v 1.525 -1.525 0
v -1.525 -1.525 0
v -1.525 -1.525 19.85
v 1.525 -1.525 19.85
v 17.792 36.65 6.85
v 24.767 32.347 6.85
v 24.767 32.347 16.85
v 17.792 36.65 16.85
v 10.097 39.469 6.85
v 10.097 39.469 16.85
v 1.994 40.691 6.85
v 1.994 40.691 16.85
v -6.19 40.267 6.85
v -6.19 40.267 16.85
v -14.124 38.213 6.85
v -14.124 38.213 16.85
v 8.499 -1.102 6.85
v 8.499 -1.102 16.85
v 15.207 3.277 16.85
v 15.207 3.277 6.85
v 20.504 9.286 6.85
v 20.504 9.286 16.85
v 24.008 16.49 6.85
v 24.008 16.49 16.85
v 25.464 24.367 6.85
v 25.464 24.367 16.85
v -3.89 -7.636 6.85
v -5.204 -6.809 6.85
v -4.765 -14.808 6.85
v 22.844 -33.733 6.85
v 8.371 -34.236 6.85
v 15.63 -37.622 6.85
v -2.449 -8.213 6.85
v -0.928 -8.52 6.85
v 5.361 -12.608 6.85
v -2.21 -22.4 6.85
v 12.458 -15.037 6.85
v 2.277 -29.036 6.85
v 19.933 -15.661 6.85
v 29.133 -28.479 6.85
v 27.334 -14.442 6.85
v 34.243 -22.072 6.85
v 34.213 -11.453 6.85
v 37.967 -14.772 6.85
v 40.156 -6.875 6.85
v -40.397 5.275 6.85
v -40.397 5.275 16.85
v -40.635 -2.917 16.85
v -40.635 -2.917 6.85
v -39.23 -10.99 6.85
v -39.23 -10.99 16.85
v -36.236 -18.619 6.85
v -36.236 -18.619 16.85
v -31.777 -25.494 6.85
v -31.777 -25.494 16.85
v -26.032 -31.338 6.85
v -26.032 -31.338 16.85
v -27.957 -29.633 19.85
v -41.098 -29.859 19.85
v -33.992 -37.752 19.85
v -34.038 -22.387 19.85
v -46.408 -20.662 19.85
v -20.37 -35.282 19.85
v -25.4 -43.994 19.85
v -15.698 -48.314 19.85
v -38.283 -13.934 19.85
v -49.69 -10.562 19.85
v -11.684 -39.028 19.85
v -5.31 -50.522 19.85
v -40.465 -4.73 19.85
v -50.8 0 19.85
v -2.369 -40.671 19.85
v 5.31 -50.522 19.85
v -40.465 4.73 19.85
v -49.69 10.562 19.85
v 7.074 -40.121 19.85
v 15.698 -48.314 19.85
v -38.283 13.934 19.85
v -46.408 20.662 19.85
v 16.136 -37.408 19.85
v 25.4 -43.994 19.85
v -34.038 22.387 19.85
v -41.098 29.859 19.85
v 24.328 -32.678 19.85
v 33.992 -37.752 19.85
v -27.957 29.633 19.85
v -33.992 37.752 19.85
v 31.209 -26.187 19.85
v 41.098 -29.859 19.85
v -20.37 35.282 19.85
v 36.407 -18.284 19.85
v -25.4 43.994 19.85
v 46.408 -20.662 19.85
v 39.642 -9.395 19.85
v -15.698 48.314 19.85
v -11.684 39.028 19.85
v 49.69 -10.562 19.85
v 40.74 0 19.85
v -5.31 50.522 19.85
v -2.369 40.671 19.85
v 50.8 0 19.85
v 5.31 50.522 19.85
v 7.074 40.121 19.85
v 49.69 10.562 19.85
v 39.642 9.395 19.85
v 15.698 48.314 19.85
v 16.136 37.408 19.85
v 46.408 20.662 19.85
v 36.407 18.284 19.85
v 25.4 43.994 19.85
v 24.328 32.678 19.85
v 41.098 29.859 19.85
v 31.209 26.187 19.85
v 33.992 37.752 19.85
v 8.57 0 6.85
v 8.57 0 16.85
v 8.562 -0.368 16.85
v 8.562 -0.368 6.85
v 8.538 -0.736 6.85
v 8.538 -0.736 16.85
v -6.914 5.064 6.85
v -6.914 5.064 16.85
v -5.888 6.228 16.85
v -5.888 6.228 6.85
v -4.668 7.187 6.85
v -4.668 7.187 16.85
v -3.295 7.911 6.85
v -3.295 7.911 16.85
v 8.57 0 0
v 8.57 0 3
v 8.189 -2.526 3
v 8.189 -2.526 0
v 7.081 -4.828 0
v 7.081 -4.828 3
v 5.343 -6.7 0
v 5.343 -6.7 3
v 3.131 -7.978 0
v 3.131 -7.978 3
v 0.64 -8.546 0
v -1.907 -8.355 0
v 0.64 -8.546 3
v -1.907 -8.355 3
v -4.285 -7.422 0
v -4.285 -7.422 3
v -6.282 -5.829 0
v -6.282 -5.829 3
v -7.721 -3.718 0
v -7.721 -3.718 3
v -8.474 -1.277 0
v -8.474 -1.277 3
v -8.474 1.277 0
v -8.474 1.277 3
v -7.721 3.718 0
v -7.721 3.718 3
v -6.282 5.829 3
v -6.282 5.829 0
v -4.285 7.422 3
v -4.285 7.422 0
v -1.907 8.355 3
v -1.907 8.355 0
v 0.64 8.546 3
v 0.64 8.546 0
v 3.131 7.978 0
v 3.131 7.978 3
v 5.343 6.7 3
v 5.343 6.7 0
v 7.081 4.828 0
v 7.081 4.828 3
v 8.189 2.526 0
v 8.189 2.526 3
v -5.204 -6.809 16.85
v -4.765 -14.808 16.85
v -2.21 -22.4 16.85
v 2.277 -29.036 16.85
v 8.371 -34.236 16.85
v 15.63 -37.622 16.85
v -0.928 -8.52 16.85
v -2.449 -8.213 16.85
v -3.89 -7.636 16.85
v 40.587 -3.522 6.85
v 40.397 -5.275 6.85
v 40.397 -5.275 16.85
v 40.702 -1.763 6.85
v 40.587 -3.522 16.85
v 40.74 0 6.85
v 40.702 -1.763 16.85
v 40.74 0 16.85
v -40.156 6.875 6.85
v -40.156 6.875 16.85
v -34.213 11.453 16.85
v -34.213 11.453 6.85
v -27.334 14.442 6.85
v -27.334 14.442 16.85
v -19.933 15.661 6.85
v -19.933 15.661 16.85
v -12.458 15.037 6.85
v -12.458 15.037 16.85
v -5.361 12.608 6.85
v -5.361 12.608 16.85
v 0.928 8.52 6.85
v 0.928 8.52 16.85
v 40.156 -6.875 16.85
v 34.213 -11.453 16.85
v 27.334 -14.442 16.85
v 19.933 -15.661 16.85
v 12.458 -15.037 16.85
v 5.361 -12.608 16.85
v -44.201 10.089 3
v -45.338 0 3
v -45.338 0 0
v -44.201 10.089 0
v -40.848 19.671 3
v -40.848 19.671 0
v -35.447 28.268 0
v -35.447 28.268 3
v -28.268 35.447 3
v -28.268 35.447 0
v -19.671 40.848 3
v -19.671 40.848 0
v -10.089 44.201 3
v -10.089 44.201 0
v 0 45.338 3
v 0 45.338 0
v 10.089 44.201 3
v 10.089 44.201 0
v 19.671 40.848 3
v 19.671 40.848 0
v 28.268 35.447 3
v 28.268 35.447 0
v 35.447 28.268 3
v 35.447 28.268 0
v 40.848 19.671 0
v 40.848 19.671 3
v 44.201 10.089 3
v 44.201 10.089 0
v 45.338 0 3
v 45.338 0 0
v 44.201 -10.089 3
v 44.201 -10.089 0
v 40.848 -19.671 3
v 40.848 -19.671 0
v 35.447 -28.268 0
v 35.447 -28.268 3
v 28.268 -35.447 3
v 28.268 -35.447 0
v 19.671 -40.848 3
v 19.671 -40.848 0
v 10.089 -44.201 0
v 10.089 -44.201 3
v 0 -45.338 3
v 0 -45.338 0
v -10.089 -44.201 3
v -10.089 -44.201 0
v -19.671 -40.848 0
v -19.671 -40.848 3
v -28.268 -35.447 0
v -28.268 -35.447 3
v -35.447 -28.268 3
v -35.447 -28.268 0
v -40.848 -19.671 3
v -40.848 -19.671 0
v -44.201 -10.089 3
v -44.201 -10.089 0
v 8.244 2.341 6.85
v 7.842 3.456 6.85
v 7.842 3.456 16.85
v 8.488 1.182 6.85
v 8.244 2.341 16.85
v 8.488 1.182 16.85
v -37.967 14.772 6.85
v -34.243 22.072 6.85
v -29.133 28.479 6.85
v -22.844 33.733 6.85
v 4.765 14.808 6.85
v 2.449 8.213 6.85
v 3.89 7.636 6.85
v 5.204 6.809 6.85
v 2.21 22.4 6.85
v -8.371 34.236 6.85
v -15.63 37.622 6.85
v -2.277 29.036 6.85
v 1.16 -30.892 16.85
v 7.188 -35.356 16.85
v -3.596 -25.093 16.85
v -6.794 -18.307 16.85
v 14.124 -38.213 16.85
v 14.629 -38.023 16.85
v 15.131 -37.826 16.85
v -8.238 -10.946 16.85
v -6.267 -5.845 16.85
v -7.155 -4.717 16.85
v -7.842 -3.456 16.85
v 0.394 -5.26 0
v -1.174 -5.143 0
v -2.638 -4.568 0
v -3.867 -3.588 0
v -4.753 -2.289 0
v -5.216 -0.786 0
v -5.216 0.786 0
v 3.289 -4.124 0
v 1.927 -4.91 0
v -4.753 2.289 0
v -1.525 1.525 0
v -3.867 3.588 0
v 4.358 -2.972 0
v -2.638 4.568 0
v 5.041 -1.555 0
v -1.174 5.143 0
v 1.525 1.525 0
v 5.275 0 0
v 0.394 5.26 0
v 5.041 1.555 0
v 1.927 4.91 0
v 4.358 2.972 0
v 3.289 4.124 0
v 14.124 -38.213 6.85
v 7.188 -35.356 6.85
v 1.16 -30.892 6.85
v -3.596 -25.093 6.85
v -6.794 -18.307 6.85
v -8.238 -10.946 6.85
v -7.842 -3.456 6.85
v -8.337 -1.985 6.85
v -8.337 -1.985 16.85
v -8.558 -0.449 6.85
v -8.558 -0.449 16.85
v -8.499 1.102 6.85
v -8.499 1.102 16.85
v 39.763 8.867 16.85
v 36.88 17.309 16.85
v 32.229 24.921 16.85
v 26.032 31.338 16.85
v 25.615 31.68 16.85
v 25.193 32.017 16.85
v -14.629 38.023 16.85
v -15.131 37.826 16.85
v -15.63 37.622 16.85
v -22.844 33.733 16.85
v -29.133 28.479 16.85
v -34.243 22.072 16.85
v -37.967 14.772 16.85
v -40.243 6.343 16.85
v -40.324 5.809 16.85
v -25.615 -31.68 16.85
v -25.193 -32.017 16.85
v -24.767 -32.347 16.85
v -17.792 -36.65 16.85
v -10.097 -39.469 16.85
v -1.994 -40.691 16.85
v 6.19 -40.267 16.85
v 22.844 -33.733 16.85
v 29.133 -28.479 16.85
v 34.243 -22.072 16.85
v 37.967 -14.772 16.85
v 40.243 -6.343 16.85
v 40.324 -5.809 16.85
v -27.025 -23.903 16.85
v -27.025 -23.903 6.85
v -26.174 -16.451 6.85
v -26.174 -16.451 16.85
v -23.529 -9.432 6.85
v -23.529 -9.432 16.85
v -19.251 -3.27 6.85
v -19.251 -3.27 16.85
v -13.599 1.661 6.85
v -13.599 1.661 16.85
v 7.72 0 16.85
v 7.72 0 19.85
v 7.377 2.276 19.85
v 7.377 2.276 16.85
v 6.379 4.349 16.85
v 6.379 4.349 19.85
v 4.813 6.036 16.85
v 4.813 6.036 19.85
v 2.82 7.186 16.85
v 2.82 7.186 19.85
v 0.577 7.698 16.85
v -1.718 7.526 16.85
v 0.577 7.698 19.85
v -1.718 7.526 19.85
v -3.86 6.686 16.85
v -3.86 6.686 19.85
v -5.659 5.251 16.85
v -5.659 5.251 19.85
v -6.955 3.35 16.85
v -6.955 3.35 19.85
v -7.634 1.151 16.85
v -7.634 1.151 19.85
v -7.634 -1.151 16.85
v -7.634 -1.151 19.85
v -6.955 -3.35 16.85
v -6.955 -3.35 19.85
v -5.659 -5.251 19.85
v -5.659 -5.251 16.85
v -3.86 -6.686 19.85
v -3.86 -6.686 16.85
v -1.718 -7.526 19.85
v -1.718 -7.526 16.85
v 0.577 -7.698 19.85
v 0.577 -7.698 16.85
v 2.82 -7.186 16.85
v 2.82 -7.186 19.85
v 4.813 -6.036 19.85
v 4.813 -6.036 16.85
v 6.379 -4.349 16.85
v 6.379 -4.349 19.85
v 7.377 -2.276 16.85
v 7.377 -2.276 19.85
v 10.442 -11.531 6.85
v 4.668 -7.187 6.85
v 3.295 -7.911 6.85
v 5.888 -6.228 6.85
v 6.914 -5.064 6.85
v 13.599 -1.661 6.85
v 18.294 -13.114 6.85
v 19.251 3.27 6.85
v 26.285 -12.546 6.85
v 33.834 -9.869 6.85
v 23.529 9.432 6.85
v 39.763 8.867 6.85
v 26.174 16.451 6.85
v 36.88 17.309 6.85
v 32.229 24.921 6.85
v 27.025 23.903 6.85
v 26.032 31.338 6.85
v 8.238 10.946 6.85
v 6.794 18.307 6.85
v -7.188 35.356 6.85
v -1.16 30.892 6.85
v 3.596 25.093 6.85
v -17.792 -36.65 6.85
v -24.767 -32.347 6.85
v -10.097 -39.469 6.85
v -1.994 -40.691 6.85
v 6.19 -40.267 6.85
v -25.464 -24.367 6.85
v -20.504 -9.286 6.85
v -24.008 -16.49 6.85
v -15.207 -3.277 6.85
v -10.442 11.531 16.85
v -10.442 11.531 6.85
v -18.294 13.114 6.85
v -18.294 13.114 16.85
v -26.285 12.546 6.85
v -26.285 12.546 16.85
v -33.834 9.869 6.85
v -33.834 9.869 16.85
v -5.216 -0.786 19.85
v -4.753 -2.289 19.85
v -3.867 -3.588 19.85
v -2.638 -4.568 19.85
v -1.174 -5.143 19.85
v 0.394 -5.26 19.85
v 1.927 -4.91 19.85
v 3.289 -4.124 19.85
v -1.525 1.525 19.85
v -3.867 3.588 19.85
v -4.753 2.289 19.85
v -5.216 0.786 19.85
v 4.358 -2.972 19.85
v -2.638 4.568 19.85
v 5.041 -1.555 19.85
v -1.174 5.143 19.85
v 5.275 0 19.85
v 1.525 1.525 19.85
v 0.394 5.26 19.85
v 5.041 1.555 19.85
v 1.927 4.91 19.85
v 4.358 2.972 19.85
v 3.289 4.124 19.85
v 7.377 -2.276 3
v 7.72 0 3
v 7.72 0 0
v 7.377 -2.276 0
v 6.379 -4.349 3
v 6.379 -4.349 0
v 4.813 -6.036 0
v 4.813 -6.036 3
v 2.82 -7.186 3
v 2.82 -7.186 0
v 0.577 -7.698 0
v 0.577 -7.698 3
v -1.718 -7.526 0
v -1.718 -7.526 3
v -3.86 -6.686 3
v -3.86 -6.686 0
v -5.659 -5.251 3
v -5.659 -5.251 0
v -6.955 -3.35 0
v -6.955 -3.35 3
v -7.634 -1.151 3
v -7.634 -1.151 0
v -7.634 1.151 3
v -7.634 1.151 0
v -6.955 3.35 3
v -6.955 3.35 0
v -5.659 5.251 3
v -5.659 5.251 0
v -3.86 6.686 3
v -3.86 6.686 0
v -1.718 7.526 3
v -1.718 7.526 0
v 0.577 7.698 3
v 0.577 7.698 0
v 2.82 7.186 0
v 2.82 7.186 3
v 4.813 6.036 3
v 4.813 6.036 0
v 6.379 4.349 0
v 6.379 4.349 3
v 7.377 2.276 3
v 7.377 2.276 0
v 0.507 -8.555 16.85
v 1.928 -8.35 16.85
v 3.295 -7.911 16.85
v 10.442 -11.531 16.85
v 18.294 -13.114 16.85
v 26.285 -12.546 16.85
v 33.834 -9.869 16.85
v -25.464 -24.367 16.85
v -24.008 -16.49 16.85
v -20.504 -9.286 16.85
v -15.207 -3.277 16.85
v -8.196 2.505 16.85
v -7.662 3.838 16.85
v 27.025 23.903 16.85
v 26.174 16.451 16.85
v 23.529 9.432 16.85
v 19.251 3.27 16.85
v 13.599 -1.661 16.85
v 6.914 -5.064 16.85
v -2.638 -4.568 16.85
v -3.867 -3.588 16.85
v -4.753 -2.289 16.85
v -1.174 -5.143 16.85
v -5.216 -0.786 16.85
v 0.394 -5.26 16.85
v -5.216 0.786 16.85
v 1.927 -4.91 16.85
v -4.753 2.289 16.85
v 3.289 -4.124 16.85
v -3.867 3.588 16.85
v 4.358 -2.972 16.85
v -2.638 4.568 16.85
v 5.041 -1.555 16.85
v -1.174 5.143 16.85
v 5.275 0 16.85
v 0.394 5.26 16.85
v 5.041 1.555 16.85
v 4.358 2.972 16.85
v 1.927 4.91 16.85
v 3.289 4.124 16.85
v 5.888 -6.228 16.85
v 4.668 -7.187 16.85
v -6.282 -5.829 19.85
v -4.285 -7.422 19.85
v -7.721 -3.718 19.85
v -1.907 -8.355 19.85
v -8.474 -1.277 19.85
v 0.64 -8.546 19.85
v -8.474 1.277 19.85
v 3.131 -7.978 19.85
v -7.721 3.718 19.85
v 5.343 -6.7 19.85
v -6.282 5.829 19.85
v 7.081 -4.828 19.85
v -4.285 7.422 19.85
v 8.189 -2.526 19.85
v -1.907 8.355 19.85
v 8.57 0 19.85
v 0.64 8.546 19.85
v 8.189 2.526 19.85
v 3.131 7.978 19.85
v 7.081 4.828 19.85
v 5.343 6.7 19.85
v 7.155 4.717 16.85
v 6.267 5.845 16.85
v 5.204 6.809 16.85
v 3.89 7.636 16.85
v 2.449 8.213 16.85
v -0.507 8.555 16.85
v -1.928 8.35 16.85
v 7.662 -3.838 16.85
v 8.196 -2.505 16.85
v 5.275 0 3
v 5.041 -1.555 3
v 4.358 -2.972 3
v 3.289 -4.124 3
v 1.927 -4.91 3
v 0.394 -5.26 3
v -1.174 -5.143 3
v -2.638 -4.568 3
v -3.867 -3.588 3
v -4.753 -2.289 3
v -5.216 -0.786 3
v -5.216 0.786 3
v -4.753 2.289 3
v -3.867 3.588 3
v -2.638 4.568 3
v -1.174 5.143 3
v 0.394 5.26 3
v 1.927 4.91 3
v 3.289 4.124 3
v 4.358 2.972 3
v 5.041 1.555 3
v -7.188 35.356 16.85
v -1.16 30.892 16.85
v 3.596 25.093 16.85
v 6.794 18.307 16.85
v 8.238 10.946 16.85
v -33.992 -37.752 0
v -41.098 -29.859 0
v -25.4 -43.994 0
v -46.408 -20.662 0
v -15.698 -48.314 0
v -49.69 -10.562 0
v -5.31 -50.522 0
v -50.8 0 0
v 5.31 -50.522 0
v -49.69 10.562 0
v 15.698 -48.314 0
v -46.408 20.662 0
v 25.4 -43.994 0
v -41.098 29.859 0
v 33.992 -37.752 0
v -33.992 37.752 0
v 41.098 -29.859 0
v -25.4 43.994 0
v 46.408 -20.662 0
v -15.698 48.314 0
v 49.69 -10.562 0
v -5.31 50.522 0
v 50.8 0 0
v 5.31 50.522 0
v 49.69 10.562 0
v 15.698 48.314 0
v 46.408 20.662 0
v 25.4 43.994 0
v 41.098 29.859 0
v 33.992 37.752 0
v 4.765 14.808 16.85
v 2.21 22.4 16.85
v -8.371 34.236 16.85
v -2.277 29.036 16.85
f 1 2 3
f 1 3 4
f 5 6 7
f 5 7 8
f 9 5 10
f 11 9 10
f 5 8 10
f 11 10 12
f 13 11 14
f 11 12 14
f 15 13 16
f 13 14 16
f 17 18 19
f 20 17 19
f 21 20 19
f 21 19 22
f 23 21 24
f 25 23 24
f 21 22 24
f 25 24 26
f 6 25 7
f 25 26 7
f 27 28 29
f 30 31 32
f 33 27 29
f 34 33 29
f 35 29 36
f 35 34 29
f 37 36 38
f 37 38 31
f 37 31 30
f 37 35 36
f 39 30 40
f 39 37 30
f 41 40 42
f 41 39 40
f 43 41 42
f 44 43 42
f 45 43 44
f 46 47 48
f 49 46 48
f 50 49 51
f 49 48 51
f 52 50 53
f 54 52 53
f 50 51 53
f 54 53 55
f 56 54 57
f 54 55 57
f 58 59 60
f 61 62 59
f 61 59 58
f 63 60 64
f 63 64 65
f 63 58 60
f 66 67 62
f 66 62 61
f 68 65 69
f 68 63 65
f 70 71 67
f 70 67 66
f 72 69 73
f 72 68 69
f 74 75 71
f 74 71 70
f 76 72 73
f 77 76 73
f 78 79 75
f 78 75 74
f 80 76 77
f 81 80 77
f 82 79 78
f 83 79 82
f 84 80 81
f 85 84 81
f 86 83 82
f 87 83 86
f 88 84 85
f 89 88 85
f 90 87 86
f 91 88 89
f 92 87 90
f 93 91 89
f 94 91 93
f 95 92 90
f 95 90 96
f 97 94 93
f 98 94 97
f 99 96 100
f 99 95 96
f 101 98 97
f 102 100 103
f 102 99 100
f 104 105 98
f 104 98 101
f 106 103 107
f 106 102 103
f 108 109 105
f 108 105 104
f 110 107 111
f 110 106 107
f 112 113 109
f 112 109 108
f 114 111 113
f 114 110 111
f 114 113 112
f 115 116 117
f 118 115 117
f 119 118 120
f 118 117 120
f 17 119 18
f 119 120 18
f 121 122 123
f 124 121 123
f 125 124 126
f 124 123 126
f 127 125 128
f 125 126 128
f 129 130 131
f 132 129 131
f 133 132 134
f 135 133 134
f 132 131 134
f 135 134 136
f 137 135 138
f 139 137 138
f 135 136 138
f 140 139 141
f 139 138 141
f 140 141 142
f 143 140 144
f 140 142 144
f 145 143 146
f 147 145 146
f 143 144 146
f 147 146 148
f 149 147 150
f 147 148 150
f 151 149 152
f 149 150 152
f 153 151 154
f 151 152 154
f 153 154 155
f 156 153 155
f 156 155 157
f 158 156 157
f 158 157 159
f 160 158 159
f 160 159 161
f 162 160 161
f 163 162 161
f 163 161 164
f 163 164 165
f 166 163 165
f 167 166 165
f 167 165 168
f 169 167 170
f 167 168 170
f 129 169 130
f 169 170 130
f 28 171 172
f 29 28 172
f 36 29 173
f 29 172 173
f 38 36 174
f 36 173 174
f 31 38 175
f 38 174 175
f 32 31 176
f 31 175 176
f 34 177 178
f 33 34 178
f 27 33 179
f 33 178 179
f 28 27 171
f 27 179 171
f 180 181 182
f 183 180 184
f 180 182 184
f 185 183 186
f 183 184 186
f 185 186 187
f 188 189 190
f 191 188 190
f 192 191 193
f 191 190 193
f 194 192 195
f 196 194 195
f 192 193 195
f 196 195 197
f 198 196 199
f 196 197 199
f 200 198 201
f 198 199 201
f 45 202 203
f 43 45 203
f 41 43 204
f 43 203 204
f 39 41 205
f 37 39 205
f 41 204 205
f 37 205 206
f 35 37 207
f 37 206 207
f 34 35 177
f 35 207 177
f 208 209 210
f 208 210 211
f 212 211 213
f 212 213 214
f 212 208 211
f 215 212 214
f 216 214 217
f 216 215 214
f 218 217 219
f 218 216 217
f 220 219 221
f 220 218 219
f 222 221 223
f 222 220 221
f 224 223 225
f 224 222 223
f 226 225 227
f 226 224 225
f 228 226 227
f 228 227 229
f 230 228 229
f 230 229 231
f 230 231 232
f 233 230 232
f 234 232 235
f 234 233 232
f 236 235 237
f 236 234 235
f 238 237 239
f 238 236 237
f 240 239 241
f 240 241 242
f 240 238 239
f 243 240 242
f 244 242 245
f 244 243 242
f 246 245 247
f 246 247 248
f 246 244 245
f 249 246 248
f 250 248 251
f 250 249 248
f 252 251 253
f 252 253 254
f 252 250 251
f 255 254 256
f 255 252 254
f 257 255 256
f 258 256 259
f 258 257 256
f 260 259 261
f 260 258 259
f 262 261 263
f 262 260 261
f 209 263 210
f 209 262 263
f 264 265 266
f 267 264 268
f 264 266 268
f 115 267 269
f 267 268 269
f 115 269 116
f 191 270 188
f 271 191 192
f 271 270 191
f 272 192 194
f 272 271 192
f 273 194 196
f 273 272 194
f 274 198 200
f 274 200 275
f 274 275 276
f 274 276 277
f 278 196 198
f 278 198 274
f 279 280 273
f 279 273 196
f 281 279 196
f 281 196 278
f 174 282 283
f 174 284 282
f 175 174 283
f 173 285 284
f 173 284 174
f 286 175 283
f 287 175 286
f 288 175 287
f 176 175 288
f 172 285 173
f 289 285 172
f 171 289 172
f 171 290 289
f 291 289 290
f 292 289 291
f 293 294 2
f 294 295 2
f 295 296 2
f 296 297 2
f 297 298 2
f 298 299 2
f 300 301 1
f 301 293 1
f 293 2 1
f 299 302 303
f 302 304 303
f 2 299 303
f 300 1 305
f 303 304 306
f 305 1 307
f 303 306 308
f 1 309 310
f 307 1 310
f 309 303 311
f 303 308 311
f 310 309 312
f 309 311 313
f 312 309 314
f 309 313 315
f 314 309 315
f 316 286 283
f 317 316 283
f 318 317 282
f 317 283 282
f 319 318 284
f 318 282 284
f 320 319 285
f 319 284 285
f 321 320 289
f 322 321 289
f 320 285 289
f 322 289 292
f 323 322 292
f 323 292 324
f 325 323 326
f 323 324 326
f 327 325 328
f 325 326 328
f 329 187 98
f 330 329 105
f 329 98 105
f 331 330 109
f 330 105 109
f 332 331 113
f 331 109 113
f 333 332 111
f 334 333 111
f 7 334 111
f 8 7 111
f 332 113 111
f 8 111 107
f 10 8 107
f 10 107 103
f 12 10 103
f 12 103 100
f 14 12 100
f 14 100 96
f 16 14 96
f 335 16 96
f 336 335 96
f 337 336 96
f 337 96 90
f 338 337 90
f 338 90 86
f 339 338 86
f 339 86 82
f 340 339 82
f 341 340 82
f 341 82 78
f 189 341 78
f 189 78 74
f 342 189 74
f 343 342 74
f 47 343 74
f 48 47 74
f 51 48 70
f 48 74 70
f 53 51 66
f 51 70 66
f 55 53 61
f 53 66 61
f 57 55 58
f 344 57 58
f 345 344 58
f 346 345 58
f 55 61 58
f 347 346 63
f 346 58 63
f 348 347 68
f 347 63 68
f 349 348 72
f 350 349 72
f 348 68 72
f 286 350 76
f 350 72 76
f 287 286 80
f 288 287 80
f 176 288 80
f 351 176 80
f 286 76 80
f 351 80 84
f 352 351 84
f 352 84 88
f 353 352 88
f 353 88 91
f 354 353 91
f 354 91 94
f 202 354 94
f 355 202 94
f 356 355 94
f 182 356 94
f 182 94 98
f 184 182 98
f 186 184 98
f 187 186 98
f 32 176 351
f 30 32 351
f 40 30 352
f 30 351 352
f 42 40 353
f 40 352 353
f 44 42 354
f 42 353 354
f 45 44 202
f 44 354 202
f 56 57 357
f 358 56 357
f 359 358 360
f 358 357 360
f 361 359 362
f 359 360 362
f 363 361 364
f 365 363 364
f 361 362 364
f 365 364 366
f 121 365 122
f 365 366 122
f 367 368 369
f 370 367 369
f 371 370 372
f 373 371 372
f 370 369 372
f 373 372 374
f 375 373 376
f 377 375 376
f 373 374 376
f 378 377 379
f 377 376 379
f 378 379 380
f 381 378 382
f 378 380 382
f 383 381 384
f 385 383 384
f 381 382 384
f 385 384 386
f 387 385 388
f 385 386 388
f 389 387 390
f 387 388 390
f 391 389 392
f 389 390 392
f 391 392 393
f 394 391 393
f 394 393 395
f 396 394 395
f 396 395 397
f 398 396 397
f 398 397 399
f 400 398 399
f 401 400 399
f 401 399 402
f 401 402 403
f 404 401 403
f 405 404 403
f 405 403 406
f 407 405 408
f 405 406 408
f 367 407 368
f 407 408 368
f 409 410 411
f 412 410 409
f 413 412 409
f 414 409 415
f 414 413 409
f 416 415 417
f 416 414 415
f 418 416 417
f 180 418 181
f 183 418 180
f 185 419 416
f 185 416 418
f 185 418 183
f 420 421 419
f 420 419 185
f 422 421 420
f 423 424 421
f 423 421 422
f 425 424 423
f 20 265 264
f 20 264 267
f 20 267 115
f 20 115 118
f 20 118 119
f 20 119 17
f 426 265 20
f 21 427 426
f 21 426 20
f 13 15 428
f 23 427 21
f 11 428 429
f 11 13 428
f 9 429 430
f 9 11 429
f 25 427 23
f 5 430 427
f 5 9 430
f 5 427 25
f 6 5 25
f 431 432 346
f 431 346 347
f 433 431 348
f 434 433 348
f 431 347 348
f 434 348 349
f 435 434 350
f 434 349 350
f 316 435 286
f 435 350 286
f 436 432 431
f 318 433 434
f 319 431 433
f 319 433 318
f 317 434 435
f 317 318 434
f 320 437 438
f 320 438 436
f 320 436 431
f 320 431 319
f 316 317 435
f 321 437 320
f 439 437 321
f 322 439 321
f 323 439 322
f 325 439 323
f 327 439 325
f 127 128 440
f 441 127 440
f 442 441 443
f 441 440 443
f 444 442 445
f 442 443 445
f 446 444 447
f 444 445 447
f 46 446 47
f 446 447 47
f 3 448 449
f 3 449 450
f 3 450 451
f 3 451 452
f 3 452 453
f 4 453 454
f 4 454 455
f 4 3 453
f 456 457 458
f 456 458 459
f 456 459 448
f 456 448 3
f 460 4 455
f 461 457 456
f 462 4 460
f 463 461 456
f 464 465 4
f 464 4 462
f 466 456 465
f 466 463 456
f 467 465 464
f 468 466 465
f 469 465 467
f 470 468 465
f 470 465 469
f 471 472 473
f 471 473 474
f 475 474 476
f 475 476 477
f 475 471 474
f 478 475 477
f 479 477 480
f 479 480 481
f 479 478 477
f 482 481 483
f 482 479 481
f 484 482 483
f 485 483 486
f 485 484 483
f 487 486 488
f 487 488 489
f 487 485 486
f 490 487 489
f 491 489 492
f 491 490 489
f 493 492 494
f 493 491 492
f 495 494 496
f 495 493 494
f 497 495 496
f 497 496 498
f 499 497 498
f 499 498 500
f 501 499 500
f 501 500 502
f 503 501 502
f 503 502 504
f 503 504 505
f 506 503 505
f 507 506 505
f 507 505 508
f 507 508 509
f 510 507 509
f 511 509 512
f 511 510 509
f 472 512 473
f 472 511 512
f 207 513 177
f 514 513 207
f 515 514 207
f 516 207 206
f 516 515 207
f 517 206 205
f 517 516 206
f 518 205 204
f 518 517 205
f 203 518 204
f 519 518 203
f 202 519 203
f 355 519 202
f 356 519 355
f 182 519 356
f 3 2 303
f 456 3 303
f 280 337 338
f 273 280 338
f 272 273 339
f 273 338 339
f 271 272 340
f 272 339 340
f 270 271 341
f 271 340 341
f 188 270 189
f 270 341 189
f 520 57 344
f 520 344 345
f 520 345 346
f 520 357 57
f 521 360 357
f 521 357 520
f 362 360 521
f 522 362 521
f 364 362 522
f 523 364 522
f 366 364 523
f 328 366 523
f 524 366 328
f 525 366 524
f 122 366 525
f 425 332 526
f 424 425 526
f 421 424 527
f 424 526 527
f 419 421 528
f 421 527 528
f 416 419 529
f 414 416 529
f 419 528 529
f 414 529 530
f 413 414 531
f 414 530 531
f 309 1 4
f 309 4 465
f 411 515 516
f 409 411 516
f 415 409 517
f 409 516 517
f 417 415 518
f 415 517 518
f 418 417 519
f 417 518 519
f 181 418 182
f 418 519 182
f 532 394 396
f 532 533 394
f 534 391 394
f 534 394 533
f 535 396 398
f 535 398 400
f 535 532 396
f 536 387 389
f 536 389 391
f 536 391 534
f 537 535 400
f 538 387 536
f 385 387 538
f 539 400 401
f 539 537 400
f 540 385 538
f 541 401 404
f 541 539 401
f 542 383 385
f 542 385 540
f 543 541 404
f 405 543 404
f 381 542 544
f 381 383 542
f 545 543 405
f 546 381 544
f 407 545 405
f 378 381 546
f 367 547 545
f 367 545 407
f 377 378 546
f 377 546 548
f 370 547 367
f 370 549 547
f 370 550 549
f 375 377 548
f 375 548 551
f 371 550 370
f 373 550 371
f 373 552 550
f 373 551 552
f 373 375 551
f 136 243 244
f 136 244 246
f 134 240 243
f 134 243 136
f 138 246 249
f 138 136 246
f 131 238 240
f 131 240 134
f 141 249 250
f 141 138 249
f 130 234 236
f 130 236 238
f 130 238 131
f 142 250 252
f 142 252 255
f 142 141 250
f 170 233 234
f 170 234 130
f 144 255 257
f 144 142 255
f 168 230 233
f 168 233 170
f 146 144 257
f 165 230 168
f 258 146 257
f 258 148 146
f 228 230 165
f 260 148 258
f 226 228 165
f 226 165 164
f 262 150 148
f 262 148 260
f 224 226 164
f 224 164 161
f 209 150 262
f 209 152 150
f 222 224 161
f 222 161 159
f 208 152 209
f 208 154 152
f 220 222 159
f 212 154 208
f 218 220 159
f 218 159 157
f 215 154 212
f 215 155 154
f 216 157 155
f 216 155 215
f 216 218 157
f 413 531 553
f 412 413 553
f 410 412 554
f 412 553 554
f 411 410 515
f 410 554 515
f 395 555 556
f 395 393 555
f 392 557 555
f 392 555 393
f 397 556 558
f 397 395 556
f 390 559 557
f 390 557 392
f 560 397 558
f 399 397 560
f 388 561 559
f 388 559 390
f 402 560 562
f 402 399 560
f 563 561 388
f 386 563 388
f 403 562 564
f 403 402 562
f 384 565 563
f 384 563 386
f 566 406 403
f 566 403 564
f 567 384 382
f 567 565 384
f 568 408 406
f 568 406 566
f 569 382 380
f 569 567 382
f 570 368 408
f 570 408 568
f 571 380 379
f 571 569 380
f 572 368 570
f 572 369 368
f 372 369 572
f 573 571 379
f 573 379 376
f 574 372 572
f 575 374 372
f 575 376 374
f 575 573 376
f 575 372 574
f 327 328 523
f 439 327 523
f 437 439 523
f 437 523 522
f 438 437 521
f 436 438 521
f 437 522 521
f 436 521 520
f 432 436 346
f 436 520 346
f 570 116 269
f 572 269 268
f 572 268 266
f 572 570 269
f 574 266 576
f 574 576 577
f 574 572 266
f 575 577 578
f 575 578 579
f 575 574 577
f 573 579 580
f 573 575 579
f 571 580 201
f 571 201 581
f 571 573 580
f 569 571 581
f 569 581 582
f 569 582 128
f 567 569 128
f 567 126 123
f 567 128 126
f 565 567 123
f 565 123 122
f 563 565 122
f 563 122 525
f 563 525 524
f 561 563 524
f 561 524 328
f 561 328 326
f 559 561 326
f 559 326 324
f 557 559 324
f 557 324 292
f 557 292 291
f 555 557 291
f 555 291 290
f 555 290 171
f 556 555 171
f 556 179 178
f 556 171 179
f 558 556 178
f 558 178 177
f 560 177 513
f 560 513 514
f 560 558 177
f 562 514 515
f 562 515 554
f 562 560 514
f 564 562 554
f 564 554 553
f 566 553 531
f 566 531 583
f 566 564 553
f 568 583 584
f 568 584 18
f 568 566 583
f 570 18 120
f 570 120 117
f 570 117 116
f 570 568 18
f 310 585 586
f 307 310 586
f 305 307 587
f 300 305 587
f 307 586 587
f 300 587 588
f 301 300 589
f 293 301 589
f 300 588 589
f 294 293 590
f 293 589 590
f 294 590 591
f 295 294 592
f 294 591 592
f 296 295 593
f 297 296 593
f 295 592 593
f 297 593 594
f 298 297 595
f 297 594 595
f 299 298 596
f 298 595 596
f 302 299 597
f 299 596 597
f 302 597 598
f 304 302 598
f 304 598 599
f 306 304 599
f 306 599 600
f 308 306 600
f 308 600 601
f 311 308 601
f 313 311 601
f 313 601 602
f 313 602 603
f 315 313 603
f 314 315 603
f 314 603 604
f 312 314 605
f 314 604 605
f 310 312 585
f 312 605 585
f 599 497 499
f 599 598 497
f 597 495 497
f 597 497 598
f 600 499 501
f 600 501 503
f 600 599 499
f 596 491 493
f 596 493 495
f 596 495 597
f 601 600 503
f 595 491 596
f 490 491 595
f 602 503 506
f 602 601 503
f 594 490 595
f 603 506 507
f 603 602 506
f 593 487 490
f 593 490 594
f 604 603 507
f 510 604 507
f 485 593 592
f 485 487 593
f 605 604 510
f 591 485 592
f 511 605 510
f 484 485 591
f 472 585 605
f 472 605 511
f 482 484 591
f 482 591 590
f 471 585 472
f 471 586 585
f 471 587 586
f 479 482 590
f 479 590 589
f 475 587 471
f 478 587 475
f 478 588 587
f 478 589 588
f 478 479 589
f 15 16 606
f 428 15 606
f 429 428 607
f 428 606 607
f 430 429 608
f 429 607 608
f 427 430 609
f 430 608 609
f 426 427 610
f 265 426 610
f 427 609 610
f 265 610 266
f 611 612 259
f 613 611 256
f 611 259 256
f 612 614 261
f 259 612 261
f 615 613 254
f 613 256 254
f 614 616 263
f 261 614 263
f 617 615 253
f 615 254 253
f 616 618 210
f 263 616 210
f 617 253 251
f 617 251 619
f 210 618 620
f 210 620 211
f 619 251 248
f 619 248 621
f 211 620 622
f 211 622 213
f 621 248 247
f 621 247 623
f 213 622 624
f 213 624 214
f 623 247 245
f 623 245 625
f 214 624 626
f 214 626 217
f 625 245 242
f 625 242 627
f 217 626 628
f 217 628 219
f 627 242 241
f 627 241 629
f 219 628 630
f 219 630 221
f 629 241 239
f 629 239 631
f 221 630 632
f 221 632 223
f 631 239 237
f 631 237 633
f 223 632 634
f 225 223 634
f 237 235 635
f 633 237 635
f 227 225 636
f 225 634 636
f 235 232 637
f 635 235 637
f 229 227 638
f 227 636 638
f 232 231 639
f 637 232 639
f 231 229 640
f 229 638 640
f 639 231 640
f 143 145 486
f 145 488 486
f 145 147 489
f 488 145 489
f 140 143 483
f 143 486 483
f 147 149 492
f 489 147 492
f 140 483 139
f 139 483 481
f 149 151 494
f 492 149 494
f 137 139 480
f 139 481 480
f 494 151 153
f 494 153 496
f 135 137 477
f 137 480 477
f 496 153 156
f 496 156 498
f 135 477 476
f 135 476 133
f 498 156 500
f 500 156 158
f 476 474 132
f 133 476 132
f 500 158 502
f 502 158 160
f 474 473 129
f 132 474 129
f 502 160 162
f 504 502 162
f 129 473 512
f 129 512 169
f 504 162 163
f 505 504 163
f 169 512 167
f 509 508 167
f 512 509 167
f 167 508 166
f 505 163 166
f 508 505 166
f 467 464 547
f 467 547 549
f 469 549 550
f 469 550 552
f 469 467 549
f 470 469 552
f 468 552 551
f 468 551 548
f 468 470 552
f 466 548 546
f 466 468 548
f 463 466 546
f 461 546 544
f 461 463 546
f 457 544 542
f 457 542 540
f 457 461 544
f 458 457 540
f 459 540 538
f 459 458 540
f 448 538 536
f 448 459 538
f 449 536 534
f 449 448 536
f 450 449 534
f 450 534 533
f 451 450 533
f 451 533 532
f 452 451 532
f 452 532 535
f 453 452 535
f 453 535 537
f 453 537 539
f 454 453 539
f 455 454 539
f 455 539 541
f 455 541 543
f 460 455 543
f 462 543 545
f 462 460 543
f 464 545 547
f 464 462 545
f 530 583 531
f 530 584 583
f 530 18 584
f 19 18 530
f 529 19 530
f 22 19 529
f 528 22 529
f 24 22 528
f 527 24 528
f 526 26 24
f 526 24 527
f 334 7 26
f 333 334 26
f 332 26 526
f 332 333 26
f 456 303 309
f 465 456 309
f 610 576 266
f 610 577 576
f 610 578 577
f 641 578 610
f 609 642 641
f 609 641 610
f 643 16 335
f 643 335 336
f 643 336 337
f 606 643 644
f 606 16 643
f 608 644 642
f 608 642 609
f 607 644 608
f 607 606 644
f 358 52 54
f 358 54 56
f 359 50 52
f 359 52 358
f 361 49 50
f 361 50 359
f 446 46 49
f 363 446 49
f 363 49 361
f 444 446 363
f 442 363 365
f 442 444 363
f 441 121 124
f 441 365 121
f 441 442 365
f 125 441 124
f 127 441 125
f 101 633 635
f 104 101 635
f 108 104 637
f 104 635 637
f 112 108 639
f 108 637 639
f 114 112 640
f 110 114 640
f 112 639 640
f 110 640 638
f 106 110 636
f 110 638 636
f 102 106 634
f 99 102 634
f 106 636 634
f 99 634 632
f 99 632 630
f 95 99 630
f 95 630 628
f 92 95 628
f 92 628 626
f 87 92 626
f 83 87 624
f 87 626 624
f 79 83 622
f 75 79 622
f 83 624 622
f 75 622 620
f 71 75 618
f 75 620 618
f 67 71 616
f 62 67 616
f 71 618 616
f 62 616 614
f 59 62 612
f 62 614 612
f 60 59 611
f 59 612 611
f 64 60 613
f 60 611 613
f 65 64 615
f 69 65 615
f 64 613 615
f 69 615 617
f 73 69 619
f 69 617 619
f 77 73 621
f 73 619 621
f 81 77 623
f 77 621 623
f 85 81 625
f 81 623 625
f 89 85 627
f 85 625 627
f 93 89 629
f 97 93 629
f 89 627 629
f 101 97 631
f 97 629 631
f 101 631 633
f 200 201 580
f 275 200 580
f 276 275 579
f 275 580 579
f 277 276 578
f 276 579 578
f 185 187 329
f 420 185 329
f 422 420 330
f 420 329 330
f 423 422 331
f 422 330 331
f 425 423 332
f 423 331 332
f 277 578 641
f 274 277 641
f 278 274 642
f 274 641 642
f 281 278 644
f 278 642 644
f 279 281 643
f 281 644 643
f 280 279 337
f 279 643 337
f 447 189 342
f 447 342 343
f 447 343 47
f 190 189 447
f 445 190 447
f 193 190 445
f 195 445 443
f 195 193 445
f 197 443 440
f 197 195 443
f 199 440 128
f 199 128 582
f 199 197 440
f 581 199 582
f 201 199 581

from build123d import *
from build123d.topology import SkipClean

# Parameters (mm, degrees)
SKETCH1_R           = 50.8
SKETCH1_R_2         = 8.57
SKETCH1_R_3         = 7.72
SKETCH1_R_4         = 5.275
SKETCH1_W           = 3.05
SKETCH1_H           = 3.05
BOSS_EXTRUDE1_DEPTH = 19.85
SKETCH2_R           = 7.72
SKETCH2_R_2         = 5.275
CUT_EXTRUDE1_DEPTH  = 3
SKETCH3_R           = 40.74
SKETCH3_R_2         = 8.57
CUT_EXTRUDE2_DEPTH  = 3
CUT_EXTRUDE3_START  = -3
SKETCH4_R           = 45.337827748
SKETCH4_R_2         = 8.57
SKETCH4_R_3         = 7.72
SKETCH4_R_4         = 5.275
CUT_EXTRUDE3_DEPTH  = 3
CUT_EXTRUDE4_DEPTH  = 10


with BuildPart() as part:
    # Sketch1 → Boss-Extrude1 (new body)
    # profile 1 of 4: a face of its own
    with BuildSketch(Plane.XY):
        Circle(SKETCH1_R)
        Circle(SKETCH1_R_2, mode=Mode.SUBTRACT)
    # profile 2 of 4: a face of its own
    with BuildSketch(Plane.XY):
        Circle(SKETCH1_R_2)
        Circle(SKETCH1_R_3, mode=Mode.SUBTRACT)
    # profile 3 of 4: a face of its own
    with BuildSketch(Plane.XY):
        Circle(SKETCH1_R_3)
        Circle(SKETCH1_R_4, mode=Mode.SUBTRACT)
    # profile 4 of 4: a face of its own
    with BuildSketch(Plane.XY):
        Circle(SKETCH1_R_4)
        Rectangle(SKETCH1_W, SKETCH1_H, mode=Mode.SUBTRACT)
    extrude(amount=BOSS_EXTRUDE1_DEPTH)

    # Sketch2 → Cut-Extrude1 (cut)
    with BuildSketch(Plane.XY.offset(19.85)):
        Circle(SKETCH2_R)
        Circle(SKETCH2_R_2, mode=Mode.SUBTRACT)
    extrude(amount=-CUT_EXTRUDE1_DEPTH, mode=Mode.SUBTRACT)

    # Sketch3 → Cut-Extrude2 (cut)
    with BuildSketch(Plane.XY.offset(19.85)):
        Circle(SKETCH3_R)
        Circle(SKETCH3_R_2, mode=Mode.SUBTRACT)
    extrude(amount=-CUT_EXTRUDE2_DEPTH, mode=Mode.SUBTRACT)

    # Sketch4 → Cut-Extrude3 (cut)
    # profile 1 of 2: a face of its own
    with BuildSketch(Plane(origin=(0, 0, 0), x_dir=(-1, 0, 0), z_dir=(0, 0, -1)).offset(CUT_EXTRUDE3_START)):
        Circle(SKETCH4_R)
        with Locations(Location((0, 0, 0), (0, 0, 180))):
            Circle(SKETCH4_R_2, mode=Mode.SUBTRACT)
    # profile 2 of 2: a face of its own
    with BuildSketch(Plane(origin=(0, 0, 0), x_dir=(-1, 0, 0), z_dir=(0, 0, -1)).offset(CUT_EXTRUDE3_START)):
        with Locations(Location((0, 0, 0), (0, 0, 180))):
            Circle(SKETCH4_R_3)
        with Locations(Location((0, 0, 0), (0, 0, 180))):
            Circle(SKETCH4_R_4, mode=Mode.SUBTRACT)
    extrude(amount=CUT_EXTRUDE3_DEPTH, mode=Mode.SUBTRACT)

    # Sketch5 → Cut-Extrude4 (cut)
    with SkipClean():  # the faces are left unmerged after this step: merging them gives an invalid solid
        with BuildSketch(Plane.XY.offset(16.85)):
            with BuildLine():
                ThreePointArc((-40.155721572, 6.875), (-19.932515852, 15.660919221), (0.928253594, 8.519580111))
                ThreePointArc((0.928253594, 8.519580111), (3.182932587, 7.956999444), (5.20358481, 6.809376265))
                ThreePointArc((5.20358481, 6.809376265), (0.190794067, 25.869806658), (-15.630243014, 37.622375036))
                ThreePointArc((-15.630243014, 37.622375036), (-31.849155862, 25.404308117), (-40.155721572, 6.875))
            make_face()
            with BuildLine():
                ThreePointArc((-14.123936135, 38.213374989), (3.596495966, 25.0925247), (7.842299603, 3.455898861))
                ThreePointArc((7.842299603, 3.455898861), (8.386101824, 1.7658415), (8.57, 0))
                ThreePointArc((8.57, 0), (8.552202829, -0.552020624), (8.498885235, -1.101748504))
                ThreePointArc((8.498885235, -1.101748504), (22.499306791, 12.76967082), (24.766811024, 32.347375036))
                ThreePointArc((24.766811024, 32.347375036), (6.076198264, 40.284332124), (-14.123936135, 38.213374989))
            make_face()
            with BuildLine():
                ThreePointArc((6.914046008, -5.063681249), (5.299497363, -6.735000201), (3.295300425, -7.911124769))
                ThreePointArc((3.295300425, -7.911124769), (22.308512723, -13.100135838), (40.397054039, -5.275))
                ThreePointArc((40.397054039, -5.275), (40.654173104, -2.643068148), (40.74, 0))
                ThreePointArc((40.74, 0), (36.880093131, 17.30914009), (26.031785437, 31.338374989))
                ThreePointArc((26.031785437, 31.338374989), (23.529011818, 9.431605478), (6.914046008, -5.063681249))
            make_face()
            with BuildLine():
                ThreePointArc((-0.928253594, -8.519580111), (-3.182932587, -7.956999444), (-5.20358481, -6.809376265))
                ThreePointArc((-5.20358481, -6.809376265), (-0.190794067, -25.869806658), (15.630243014, -37.622375036))
                ThreePointArc((15.630243014, -37.622375036), (31.849155862, -25.404308117), (40.155721572, -6.875))
                ThreePointArc((40.155721572, -6.875), (19.932515852, -15.660919221), (-0.928253594, -8.519580111))
            make_face()
            with BuildLine():
                ThreePointArc((-7.842299603, -3.455898861), (-8.48242995, -1.221999243), (-8.498885235, 1.101748504))
                ThreePointArc((-8.498885235, 1.101748504), (-22.499306791, -12.76967082), (-24.766811024, -32.347375036))
                ThreePointArc((-24.766811024, -32.347375036), (-6.076198264, -40.284332124), (14.123936135, -38.213374989))
                ThreePointArc((14.123936135, -38.213374989), (-3.596495966, -25.0925247), (-7.842299603, -3.455898861))
            make_face()
            with BuildLine():
                ThreePointArc((-6.914046008, 5.063681249), (-5.299497363, 6.735000201), (-3.295300425, 7.911124769))
                ThreePointArc((-3.295300425, 7.911124769), (-22.308512723, 13.100135838), (-40.397054039, 5.275))
                ThreePointArc((-40.397054039, 5.275), (-37.925354126, -14.880024007), (-26.031785437, -31.338374989))
                ThreePointArc((-26.031785437, -31.338374989), (-23.529011818, -9.431605478), (-6.914046008, 5.063681249))
            make_face()
        extrude(amount=-CUT_EXTRUDE4_DEPTH, mode=Mode.SUBTRACT)


solid = part.part
